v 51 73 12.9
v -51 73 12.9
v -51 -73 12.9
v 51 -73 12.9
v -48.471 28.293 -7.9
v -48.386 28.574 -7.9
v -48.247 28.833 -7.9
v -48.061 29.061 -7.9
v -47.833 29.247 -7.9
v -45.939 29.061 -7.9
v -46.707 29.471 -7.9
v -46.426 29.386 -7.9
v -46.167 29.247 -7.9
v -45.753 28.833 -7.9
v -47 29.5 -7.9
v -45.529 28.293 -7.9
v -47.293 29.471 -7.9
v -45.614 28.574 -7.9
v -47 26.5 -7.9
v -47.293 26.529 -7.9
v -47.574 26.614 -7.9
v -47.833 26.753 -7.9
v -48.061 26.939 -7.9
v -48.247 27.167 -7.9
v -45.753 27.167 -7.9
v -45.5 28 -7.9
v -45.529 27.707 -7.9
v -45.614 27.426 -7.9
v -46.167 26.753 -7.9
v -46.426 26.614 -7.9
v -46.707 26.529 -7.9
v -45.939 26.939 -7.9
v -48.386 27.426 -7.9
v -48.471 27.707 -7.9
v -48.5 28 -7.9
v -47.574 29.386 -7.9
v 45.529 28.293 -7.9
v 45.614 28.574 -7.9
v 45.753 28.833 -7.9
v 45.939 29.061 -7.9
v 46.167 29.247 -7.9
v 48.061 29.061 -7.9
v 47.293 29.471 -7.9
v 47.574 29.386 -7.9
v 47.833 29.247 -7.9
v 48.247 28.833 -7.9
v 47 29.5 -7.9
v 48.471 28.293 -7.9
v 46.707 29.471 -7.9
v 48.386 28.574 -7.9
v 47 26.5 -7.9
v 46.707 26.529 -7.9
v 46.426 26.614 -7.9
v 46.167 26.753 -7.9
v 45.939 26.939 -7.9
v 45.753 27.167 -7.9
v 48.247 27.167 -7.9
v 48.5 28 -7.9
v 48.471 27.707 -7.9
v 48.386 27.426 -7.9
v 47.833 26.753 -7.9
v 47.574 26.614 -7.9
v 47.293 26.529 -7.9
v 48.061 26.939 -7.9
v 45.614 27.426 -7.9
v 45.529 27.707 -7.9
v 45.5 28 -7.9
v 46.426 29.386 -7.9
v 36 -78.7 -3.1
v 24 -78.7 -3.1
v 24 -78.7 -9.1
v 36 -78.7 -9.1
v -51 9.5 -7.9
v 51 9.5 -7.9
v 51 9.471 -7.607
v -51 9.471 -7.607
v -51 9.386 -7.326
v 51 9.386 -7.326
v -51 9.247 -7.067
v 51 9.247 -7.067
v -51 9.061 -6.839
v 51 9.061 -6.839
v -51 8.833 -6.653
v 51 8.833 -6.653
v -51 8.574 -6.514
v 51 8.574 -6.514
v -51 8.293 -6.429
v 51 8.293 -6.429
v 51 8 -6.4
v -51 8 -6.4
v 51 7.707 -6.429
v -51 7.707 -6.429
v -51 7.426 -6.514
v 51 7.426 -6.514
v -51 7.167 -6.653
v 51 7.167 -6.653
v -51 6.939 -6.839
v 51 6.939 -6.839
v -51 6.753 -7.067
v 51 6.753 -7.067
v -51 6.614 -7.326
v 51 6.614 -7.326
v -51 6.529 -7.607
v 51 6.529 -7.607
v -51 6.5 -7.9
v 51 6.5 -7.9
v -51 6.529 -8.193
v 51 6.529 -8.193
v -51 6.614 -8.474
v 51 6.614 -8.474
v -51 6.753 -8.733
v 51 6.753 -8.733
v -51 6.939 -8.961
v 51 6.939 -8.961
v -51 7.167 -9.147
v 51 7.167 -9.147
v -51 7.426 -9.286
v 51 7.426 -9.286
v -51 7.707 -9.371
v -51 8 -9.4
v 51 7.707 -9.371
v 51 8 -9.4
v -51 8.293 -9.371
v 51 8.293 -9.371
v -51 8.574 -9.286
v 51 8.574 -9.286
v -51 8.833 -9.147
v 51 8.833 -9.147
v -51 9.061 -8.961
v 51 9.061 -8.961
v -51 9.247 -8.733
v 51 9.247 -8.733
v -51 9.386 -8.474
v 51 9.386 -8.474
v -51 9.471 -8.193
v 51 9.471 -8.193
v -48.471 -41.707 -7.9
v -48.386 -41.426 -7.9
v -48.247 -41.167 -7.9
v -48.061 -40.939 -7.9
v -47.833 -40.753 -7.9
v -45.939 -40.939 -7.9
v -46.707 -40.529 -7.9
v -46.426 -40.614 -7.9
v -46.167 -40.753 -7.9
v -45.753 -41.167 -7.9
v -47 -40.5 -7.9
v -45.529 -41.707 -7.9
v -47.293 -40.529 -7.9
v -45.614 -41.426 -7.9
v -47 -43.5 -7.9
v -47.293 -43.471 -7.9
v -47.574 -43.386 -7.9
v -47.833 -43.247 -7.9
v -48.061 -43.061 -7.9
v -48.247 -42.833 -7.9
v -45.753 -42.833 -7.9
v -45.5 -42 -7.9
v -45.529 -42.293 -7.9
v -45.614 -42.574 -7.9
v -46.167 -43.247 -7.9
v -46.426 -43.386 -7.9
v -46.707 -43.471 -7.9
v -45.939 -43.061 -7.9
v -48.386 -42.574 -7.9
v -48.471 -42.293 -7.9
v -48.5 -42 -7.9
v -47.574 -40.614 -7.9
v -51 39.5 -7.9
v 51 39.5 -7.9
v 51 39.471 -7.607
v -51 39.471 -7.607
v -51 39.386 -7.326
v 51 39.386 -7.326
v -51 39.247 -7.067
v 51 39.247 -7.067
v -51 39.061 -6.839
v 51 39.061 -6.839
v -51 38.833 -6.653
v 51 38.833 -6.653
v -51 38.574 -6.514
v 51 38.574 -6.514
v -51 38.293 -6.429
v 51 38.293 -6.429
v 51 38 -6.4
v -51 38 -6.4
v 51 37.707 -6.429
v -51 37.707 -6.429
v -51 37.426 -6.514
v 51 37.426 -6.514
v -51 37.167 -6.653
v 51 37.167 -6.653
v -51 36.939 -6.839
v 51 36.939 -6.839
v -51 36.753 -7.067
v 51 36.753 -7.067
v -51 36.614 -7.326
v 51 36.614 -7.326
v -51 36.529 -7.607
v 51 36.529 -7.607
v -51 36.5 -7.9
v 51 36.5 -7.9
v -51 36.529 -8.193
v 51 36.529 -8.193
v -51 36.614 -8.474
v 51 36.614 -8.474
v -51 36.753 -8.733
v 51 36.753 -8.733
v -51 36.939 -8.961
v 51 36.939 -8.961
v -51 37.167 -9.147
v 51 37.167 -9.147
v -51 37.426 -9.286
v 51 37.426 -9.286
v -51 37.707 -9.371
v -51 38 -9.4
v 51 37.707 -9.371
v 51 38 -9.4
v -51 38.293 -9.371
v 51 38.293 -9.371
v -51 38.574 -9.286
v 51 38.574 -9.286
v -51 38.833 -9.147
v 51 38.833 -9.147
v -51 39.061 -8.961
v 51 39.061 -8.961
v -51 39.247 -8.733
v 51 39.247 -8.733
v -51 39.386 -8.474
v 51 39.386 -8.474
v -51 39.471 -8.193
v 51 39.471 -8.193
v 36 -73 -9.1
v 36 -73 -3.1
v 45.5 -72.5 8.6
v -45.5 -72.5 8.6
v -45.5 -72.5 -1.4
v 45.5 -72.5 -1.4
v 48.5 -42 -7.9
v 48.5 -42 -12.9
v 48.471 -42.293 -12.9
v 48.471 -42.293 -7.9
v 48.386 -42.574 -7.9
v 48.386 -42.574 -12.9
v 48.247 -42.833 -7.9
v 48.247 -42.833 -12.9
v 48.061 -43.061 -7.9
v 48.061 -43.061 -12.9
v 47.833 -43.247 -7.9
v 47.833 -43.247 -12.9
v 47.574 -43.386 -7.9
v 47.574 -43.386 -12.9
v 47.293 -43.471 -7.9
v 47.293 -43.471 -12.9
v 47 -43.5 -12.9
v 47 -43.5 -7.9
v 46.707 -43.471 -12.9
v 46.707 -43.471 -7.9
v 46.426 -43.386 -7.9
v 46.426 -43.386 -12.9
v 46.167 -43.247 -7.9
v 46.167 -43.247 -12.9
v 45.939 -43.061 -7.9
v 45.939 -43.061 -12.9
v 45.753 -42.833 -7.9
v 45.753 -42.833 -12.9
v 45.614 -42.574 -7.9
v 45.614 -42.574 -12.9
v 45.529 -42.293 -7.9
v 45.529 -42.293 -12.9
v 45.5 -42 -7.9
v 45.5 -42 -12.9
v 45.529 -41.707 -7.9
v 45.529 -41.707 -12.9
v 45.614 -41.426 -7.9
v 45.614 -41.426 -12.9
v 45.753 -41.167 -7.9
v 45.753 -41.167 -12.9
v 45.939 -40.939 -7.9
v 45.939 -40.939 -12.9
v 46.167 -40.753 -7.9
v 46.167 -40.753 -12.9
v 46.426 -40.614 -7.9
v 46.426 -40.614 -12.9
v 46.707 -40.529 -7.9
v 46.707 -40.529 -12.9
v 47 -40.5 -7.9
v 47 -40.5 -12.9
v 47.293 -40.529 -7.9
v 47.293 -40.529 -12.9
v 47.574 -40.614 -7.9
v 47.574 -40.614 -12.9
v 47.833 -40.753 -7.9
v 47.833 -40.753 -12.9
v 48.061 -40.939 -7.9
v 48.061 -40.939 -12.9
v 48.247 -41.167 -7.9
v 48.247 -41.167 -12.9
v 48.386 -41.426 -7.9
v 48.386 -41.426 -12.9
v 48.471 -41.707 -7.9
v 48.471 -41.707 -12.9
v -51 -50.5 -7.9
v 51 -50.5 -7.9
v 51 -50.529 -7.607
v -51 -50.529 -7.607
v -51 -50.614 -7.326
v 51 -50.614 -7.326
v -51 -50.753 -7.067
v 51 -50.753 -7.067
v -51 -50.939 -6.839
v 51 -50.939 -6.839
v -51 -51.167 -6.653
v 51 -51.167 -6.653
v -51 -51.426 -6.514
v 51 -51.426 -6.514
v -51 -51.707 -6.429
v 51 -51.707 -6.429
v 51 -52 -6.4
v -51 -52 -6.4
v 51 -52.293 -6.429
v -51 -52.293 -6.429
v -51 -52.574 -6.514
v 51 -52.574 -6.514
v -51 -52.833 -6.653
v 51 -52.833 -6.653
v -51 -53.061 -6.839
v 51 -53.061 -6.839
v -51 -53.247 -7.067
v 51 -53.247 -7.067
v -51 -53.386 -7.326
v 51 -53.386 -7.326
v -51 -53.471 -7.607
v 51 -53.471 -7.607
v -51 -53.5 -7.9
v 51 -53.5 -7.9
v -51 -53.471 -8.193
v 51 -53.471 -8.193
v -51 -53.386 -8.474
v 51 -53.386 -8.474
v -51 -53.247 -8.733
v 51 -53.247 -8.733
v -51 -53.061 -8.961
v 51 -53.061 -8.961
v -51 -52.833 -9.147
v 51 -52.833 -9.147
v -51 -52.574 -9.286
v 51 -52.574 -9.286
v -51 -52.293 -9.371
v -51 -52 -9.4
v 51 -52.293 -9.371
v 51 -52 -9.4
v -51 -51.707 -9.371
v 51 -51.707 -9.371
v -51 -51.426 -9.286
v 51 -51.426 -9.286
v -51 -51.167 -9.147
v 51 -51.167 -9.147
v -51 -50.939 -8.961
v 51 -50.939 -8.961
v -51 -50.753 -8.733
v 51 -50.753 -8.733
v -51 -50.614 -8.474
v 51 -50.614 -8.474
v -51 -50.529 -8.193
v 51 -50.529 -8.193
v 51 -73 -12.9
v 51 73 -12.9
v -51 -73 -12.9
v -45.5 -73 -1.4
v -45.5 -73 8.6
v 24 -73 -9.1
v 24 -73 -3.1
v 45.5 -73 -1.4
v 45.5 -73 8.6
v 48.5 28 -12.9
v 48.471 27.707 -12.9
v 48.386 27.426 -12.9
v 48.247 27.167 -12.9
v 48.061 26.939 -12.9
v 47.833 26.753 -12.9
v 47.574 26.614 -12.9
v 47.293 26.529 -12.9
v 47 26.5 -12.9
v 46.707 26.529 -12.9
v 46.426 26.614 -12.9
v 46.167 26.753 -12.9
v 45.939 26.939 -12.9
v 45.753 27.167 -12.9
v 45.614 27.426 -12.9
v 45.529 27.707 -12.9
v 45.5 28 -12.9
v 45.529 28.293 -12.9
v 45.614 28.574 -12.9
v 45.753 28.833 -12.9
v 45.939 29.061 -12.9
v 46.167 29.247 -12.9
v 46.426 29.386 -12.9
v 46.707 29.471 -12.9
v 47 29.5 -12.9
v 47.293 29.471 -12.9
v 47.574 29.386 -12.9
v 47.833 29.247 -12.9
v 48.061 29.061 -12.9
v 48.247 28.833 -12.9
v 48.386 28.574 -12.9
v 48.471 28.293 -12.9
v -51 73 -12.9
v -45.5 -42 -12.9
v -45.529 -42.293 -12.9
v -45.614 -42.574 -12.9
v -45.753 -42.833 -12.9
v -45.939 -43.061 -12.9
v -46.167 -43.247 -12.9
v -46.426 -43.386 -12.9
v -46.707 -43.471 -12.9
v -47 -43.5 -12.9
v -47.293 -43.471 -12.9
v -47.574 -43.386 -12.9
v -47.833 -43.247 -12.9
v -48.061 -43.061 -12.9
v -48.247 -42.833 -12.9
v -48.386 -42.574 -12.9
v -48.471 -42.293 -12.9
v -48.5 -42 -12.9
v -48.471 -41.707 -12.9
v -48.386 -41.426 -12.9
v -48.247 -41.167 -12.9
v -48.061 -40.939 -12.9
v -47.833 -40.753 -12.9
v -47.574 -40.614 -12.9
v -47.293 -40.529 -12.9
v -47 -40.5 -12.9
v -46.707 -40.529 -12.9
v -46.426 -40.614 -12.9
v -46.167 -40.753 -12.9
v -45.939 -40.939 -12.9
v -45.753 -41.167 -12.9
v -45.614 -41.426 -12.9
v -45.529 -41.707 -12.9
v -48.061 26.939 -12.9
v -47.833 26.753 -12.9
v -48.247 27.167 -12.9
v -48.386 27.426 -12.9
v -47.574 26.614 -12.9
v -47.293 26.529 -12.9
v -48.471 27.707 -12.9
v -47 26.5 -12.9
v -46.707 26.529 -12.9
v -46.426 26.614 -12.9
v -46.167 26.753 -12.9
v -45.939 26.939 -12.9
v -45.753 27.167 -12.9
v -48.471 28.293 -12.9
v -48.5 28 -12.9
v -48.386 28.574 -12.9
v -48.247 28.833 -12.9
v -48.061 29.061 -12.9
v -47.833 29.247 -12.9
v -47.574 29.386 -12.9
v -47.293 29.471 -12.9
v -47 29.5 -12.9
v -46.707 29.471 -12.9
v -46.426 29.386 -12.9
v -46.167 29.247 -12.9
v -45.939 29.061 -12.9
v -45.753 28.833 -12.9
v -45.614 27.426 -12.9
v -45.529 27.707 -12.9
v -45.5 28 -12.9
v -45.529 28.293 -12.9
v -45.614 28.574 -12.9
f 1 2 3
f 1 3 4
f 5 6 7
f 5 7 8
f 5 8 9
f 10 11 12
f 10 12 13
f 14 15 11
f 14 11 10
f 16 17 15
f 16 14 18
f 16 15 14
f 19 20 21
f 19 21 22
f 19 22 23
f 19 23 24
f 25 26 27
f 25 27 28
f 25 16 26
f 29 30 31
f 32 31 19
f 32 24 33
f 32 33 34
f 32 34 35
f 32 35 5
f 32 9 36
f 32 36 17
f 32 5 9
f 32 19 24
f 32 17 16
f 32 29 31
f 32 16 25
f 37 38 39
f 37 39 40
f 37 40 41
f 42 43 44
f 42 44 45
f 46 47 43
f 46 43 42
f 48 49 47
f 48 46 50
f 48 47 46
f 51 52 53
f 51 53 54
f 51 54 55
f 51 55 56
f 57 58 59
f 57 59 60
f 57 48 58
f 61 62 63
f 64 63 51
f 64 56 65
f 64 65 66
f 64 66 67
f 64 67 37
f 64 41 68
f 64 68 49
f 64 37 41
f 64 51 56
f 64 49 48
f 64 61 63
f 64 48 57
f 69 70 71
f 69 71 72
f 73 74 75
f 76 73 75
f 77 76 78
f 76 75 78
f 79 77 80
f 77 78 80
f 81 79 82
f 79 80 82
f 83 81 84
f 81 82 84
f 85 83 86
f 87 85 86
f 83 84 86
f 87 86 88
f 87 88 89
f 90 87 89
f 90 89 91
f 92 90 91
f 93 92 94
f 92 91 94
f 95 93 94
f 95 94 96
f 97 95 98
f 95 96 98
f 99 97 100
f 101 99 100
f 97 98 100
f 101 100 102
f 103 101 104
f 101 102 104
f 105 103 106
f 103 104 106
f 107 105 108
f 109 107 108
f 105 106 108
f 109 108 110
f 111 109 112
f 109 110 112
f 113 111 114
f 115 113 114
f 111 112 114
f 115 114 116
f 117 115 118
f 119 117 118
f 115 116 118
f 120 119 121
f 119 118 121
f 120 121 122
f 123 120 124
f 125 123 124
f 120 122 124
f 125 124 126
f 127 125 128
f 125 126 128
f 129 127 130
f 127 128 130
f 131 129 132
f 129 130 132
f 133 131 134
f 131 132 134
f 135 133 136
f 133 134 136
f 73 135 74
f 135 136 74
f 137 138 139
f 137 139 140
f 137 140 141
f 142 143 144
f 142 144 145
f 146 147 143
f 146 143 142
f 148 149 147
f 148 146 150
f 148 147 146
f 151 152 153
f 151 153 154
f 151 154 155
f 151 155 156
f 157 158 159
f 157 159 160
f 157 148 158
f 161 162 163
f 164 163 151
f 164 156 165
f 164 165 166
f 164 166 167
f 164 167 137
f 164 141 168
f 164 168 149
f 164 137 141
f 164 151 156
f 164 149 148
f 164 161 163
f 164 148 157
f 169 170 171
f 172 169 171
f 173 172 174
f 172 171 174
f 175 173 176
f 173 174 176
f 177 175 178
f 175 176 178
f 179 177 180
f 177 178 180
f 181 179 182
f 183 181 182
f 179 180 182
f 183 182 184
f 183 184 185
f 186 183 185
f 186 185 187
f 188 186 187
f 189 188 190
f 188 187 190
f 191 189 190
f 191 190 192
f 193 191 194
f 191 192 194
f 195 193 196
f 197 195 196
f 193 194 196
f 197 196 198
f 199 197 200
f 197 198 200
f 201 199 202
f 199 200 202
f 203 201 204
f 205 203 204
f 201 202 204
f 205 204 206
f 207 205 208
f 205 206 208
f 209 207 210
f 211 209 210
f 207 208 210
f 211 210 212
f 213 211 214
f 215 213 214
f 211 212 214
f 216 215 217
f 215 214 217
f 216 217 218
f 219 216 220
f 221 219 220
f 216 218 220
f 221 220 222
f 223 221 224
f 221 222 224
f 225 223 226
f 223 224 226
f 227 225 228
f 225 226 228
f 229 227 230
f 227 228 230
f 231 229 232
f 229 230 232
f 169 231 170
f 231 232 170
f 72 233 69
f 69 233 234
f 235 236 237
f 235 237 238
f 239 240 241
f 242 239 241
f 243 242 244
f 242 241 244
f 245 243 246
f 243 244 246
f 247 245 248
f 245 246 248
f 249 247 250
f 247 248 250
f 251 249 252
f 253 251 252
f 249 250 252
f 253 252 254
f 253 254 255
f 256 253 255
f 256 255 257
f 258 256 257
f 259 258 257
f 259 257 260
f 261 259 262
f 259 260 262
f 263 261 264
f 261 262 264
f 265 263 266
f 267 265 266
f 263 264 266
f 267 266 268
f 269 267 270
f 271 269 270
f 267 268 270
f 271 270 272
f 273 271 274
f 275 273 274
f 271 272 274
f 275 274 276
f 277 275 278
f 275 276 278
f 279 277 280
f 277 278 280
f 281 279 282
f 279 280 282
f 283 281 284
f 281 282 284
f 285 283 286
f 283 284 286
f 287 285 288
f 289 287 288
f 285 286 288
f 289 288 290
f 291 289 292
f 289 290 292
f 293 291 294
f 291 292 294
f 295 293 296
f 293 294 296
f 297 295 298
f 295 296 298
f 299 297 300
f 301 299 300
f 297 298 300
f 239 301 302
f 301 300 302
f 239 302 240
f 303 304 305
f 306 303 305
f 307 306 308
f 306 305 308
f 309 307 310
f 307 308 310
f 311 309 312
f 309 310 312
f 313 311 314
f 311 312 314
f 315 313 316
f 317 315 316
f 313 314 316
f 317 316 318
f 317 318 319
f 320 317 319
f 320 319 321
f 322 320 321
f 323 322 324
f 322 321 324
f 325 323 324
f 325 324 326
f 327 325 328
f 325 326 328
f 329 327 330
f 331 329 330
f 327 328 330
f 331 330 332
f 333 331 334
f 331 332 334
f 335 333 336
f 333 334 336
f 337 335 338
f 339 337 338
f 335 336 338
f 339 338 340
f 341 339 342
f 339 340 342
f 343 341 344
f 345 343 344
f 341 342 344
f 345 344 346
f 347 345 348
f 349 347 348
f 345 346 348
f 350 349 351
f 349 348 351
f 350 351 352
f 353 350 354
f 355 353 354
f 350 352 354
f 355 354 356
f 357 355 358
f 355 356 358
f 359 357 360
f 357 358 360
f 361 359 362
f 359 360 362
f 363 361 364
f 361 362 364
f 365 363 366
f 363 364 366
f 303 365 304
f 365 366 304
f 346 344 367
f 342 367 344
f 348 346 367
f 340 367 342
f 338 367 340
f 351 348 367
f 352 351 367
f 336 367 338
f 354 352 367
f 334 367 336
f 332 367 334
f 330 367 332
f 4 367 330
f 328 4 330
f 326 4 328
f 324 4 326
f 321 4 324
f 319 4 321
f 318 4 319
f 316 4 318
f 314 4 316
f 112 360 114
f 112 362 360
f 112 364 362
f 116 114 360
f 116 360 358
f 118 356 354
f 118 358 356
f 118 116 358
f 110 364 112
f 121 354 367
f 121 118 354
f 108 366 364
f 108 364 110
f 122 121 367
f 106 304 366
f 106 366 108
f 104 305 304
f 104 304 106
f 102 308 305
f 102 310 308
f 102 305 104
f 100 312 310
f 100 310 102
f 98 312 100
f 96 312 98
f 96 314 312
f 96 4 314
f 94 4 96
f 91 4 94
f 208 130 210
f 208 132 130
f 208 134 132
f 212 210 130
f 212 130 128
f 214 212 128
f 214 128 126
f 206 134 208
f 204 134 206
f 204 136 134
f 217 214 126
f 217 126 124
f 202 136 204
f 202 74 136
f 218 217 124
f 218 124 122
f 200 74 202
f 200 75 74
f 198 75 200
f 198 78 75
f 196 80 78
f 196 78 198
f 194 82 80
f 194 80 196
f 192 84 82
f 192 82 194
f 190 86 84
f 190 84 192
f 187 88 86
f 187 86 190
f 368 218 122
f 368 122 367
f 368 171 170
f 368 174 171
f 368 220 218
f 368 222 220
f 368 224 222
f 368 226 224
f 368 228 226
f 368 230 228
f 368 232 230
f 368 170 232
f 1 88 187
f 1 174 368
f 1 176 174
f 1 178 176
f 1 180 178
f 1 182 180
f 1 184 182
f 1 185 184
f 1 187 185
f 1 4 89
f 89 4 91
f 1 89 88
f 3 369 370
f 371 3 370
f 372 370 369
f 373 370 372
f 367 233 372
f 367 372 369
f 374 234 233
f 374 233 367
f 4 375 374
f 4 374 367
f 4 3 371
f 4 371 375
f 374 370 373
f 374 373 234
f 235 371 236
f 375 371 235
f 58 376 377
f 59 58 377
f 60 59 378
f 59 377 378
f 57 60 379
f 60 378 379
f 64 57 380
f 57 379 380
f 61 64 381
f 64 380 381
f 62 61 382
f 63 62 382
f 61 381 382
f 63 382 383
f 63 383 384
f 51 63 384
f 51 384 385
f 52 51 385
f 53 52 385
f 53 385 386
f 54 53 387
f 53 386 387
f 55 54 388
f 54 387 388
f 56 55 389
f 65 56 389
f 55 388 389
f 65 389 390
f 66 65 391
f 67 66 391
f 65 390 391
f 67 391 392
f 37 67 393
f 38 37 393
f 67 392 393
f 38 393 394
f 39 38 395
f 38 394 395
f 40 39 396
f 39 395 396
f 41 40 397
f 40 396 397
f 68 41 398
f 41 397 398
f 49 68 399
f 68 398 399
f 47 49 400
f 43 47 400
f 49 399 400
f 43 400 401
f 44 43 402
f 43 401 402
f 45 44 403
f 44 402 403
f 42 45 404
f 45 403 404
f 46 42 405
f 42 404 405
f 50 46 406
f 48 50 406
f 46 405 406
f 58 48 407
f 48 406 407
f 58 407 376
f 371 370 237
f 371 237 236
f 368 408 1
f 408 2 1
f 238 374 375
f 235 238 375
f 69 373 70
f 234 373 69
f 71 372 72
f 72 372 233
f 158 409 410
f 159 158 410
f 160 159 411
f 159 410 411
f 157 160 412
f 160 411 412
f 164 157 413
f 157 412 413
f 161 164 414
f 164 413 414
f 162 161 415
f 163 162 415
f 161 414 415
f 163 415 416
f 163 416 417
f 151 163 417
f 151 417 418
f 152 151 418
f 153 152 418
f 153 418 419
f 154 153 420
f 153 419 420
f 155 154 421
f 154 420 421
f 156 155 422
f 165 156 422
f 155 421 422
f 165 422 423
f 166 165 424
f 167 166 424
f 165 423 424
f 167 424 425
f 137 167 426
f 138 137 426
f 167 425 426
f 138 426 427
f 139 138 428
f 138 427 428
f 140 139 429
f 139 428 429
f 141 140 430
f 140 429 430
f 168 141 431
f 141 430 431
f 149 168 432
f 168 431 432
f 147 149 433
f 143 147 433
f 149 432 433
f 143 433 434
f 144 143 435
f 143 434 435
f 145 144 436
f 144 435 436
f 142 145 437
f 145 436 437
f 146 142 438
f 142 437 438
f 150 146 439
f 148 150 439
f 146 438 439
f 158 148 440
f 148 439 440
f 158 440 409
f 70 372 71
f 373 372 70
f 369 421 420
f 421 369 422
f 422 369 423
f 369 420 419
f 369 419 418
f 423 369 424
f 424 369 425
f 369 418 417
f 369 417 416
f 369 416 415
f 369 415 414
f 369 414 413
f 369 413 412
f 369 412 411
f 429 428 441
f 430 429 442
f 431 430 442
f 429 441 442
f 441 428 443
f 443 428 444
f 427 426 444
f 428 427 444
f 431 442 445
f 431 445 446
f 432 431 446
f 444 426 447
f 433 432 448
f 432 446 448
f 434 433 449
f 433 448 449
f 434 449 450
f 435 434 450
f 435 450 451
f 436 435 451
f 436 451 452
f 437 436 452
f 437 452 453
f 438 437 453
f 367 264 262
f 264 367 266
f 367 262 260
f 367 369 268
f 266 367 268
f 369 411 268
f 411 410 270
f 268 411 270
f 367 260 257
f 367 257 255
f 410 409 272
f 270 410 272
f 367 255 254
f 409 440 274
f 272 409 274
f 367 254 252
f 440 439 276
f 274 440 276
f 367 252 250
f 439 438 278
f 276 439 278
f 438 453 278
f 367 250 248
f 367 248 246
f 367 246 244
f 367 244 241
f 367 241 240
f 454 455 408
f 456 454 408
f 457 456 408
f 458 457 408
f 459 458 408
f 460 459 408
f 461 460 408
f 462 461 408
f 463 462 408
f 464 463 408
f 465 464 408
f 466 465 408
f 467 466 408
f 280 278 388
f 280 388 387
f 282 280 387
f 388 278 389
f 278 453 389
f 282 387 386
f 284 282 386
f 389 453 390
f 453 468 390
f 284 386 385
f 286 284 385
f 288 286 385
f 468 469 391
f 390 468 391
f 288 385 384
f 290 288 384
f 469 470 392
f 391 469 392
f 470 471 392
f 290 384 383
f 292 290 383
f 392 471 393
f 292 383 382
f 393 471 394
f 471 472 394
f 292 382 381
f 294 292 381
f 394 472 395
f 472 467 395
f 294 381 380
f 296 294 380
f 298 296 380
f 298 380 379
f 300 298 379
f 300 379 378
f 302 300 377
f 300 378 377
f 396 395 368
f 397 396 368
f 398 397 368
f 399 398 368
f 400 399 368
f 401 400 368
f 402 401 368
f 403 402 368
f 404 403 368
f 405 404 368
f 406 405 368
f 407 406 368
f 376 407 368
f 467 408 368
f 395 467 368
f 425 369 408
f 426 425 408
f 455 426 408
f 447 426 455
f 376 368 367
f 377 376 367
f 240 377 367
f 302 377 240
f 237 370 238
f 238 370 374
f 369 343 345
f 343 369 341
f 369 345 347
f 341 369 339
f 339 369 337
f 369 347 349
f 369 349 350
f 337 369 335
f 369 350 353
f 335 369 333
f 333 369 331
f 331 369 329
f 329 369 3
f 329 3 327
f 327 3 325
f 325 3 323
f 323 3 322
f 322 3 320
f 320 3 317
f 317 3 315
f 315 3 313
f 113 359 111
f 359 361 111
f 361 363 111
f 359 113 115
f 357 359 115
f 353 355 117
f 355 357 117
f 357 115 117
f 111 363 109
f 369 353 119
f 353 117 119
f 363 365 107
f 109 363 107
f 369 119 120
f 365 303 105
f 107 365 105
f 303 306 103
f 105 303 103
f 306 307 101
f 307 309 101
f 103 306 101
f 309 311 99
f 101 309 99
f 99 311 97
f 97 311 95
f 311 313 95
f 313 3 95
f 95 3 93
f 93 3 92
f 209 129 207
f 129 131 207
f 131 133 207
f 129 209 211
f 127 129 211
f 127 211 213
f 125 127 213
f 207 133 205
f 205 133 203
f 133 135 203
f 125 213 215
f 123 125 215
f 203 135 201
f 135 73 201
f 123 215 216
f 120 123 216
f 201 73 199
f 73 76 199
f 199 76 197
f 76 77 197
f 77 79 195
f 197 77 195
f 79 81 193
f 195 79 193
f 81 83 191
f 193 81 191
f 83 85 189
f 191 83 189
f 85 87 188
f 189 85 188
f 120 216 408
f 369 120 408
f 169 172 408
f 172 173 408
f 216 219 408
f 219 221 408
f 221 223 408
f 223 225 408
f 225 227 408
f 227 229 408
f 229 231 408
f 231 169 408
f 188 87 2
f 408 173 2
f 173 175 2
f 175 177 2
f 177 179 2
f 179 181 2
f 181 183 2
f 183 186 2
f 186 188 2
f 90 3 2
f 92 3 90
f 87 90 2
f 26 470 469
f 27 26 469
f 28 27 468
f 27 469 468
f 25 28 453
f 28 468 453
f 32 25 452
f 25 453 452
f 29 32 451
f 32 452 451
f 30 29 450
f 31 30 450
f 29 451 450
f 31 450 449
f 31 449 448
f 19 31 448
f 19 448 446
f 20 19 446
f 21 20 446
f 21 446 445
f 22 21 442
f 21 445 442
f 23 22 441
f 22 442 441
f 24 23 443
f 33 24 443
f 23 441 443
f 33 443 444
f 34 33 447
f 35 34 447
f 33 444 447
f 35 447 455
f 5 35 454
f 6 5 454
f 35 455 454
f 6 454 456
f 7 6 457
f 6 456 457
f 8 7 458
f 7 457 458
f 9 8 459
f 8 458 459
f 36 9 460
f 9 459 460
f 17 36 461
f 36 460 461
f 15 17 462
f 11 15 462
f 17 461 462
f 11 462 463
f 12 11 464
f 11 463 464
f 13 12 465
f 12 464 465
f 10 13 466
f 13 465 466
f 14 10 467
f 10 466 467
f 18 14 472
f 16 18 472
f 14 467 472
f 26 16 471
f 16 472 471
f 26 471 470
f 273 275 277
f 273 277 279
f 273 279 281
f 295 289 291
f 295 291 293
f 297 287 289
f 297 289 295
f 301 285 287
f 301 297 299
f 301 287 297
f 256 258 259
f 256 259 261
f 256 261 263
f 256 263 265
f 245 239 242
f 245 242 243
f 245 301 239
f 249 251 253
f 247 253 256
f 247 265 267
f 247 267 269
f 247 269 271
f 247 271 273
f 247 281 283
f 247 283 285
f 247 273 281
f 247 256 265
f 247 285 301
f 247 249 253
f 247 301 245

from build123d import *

# Parameters (mm, degrees)
SKETCH_W        = 102
SKETCH_H        = 146
PAD_DEPTH       = 12.9
SKETCH010_R     = 1.5
POCKET_DEPTH    = 102
SKETCH012_R     = 1.5
POCKET005_DEPTH = 5
SKETCH003_W     = 12
SKETCH003_H     = 6
PAD004_DEPTH    = 5.7
SKETCH004_W     = 91
SKETCH004_H     = 10
POCKET007_DEPTH = 0.5


with BuildPart() as part:
    # Sketch → Pad (new body, symmetric)
    with BuildSketch(Plane.XY):
        Rectangle(SKETCH_W, SKETCH_H)
    extrude(amount=PAD_DEPTH, both=True)

    # Sketch010 (on Face3 of Pad) → Pocket (cut)
    with BuildSketch(Plane.YZ.offset(51)):
        with Locations((-52, -7.9)):
            Circle(SKETCH010_R)
        with Locations((8, -7.9)):
            Circle(SKETCH010_R)
        with Locations((38, -7.9)):
            Circle(SKETCH010_R)
    extrude(amount=-POCKET_DEPTH, mode=Mode.SUBTRACT)

    # Sketch012 (on Face3 of Pocket) → Pocket005 (cut)
    with BuildSketch(Plane(origin=(0, 0, -12.9), x_dir=(1, 0, 0), z_dir=(0, 0, -1))):
        with Locations((-47, 42)):
            Circle(SKETCH012_R)
        with Locations((47, 42)):
            Circle(SKETCH012_R)
        with Locations((-47, -28)):
            Circle(SKETCH012_R)
        with Locations((47, -28)):
            Circle(SKETCH012_R)
    extrude(amount=-POCKET005_DEPTH, mode=Mode.SUBTRACT)

    # Sketch003 (on Face2 of Pad) → Pad004 (join)
    with BuildSketch(Plane.XZ.offset(73)):
        with Locations((30, -6.1)):
            Rectangle(SKETCH003_W, SKETCH003_H)
    extrude(amount=PAD004_DEPTH)

    # Sketch004 (on Face2 of Pad) → Pocket007 (cut)
    with BuildSketch(Plane.XZ.offset(73)):
        with Locations((0, 3.6)):
            Rectangle(SKETCH004_W, SKETCH004_H)
    extrude(amount=-POCKET007_DEPTH, mode=Mode.SUBTRACT)


solid = part.part
